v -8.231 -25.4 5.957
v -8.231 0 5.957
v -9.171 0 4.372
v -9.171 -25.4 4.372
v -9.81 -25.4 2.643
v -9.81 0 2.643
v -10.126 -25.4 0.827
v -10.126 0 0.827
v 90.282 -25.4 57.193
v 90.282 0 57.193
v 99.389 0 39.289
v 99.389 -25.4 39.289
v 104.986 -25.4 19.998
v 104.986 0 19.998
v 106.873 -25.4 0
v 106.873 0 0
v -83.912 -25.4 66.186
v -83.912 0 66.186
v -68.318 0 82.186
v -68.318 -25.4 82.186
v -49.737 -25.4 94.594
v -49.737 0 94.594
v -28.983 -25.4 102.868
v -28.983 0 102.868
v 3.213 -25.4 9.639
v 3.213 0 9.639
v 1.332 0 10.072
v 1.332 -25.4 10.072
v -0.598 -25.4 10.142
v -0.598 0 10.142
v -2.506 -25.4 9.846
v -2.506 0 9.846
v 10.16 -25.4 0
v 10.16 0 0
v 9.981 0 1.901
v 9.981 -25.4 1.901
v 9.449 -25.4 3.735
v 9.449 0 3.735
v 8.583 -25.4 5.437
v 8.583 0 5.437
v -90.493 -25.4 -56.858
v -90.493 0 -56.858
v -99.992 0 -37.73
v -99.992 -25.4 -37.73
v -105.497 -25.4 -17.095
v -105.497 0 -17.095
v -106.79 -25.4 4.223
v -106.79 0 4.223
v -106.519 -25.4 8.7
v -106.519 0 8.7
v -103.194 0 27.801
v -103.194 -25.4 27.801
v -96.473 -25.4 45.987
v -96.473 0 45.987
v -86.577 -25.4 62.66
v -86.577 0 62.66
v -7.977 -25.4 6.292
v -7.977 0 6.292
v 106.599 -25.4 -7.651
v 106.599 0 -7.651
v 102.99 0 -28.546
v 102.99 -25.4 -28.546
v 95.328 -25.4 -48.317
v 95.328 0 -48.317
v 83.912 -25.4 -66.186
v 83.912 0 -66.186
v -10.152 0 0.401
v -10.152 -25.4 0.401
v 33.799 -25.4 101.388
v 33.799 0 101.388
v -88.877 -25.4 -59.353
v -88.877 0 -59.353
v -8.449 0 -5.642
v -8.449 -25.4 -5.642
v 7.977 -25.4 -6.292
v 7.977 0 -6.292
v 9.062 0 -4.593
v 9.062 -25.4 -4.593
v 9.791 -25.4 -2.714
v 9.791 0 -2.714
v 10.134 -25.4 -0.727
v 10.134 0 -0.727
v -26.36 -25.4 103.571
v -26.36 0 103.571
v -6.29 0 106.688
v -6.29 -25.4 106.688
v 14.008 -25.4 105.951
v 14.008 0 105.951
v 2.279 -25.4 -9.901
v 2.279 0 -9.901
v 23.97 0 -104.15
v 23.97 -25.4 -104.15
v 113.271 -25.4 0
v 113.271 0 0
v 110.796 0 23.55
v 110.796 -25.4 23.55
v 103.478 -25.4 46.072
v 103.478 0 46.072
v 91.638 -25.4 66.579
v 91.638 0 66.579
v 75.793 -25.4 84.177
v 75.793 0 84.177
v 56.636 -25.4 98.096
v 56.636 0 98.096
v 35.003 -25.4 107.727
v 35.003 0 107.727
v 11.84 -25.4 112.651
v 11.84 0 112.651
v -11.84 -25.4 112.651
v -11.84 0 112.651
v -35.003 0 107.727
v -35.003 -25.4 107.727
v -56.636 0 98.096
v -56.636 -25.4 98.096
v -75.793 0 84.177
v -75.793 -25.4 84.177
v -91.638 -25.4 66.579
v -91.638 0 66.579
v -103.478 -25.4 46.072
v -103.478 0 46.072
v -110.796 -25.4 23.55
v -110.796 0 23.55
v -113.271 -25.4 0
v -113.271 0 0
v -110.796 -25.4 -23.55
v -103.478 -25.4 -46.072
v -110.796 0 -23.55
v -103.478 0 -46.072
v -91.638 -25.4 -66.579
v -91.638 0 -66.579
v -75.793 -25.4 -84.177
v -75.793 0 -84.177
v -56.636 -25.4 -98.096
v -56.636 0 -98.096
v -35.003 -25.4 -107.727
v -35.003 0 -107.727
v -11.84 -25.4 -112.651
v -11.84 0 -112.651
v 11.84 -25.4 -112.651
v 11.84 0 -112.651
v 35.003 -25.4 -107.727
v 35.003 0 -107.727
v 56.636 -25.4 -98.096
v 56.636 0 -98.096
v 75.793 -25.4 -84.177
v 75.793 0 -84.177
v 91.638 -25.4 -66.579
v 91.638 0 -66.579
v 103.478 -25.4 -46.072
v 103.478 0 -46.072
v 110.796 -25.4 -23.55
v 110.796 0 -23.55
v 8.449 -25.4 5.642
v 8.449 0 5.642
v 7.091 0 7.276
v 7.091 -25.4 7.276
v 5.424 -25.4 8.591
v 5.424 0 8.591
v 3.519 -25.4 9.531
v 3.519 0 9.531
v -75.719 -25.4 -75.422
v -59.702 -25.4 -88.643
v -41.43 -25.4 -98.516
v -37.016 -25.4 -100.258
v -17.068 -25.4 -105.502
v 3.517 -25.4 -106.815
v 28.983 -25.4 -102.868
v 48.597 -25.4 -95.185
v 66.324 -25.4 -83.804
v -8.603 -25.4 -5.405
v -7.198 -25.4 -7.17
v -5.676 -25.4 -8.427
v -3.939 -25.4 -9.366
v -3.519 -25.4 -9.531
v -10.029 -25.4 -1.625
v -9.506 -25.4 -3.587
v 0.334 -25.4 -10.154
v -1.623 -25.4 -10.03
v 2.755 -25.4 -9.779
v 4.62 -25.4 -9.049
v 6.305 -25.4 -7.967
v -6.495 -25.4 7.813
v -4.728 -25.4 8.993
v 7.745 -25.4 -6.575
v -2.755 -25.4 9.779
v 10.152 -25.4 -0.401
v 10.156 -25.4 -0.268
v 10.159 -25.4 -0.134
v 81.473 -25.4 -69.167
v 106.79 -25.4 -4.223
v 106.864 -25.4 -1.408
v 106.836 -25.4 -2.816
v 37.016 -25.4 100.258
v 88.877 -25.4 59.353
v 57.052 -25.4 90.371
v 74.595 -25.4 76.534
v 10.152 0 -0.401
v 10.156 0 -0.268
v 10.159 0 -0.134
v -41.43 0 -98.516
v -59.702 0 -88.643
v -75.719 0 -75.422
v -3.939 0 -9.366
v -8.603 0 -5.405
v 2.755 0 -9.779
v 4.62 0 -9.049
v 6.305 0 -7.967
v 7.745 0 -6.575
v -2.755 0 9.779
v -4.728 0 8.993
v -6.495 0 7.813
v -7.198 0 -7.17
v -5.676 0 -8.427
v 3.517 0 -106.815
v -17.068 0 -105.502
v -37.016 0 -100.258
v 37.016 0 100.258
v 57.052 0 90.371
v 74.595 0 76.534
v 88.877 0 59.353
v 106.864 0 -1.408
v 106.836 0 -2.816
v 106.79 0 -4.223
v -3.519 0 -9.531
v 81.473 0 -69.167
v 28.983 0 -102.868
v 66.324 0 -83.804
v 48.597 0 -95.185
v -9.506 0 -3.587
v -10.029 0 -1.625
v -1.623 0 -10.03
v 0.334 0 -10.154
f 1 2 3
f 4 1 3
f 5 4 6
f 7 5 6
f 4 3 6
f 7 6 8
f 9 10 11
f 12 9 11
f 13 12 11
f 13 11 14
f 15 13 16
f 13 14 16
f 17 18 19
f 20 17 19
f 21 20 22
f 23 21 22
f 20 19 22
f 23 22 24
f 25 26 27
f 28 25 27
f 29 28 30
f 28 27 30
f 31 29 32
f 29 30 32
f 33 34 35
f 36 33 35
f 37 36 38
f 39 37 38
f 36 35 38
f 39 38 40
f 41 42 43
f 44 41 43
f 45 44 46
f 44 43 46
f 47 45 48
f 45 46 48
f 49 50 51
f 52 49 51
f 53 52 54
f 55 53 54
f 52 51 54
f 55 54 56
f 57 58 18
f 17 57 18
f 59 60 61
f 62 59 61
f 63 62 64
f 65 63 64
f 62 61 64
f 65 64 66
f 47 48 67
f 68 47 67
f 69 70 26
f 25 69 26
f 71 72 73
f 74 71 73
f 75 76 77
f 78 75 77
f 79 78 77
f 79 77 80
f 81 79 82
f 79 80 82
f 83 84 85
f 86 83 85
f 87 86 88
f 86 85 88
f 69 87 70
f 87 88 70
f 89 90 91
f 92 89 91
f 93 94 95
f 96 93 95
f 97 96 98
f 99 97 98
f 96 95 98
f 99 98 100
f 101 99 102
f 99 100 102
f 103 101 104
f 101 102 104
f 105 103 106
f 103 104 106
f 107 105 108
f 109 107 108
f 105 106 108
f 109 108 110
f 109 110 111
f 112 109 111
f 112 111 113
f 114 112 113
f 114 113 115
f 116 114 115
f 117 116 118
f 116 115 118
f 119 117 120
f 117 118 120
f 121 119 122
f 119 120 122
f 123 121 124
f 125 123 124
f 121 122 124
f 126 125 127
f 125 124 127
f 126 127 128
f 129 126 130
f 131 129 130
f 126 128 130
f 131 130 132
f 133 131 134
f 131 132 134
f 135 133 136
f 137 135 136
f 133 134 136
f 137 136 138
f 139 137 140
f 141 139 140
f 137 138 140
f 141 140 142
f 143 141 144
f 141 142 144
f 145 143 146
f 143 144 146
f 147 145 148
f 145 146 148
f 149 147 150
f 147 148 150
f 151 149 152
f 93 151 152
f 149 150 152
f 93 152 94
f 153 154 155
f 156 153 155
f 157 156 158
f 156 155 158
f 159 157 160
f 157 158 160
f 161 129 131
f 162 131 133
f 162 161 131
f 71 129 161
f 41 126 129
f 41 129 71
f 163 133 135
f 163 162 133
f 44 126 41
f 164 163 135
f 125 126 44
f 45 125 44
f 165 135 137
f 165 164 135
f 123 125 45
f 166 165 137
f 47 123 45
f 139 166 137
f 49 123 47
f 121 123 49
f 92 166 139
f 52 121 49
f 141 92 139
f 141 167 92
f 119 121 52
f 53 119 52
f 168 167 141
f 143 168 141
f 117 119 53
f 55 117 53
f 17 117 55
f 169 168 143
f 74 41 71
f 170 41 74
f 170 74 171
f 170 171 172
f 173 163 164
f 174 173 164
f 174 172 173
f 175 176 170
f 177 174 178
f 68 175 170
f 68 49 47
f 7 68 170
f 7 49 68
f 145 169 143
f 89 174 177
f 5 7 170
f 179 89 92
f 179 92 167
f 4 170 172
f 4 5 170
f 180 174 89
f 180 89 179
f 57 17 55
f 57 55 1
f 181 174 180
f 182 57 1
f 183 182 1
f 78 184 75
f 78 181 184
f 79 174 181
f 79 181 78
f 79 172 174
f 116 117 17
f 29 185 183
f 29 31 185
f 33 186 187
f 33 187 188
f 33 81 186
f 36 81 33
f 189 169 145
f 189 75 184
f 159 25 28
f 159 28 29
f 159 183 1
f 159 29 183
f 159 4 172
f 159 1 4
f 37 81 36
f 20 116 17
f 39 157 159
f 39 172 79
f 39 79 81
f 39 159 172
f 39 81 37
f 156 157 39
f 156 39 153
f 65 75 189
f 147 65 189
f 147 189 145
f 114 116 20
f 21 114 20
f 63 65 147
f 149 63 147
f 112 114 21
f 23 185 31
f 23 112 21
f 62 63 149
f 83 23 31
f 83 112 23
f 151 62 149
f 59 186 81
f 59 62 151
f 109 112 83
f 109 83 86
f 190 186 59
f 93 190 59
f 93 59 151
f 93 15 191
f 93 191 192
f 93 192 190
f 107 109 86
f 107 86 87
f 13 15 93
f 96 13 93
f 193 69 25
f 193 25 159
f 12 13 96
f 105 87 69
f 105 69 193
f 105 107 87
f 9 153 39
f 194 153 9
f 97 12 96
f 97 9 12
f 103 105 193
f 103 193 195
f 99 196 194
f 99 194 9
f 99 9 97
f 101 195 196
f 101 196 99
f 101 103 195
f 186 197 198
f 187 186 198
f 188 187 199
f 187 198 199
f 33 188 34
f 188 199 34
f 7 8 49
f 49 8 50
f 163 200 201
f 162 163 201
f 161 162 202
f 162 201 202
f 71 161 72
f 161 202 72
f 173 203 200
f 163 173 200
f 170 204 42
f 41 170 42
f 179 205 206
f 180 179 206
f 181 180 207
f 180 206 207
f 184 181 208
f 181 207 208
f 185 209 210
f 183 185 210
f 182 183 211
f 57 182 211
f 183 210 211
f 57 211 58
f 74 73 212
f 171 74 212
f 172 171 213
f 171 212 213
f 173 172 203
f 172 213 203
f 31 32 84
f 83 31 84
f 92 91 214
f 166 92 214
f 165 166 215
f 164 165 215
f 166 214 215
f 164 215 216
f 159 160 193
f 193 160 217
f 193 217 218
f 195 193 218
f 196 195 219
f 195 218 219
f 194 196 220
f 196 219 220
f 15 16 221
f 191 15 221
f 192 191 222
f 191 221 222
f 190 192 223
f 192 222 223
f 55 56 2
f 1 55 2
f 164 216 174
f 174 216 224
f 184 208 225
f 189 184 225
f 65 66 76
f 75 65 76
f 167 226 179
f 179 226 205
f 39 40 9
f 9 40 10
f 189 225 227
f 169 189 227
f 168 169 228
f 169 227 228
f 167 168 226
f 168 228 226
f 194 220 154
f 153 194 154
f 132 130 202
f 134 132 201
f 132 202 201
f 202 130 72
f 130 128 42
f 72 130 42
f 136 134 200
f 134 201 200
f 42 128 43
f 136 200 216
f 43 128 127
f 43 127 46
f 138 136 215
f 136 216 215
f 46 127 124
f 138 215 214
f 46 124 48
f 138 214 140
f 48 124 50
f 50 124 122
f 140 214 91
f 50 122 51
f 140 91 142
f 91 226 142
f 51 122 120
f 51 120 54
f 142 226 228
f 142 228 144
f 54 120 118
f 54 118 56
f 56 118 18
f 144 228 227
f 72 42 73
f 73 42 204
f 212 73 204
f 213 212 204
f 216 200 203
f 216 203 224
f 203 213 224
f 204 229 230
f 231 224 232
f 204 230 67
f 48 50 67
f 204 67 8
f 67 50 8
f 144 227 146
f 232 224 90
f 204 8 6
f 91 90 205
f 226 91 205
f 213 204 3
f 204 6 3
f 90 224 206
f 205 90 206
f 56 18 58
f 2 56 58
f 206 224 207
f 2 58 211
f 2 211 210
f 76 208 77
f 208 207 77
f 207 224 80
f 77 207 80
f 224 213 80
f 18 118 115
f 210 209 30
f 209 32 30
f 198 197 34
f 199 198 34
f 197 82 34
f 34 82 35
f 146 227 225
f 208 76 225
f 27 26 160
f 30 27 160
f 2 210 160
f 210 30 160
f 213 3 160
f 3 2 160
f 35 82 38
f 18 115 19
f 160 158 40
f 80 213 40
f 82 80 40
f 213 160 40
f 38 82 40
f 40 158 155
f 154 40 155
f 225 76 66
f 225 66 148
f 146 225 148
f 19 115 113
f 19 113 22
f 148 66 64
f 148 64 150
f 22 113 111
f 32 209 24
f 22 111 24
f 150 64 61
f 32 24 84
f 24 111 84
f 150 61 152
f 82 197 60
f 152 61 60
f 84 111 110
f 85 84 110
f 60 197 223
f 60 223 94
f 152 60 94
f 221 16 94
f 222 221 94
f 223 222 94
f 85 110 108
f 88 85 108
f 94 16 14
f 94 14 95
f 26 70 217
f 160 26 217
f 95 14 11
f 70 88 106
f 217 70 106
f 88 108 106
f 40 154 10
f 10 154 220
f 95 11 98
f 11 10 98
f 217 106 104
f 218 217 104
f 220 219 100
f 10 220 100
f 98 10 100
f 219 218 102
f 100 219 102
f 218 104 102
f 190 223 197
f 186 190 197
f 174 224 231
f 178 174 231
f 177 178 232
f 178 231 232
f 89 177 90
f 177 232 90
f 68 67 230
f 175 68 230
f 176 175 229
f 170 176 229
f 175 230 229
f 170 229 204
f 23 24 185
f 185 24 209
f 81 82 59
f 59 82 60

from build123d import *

# Parameters (mm, degrees)
F1_DEPTH = 25.4
F0_R     = 113.2713200319
F2_DEPTH = 25.4


with BuildPart() as f1:
    # F0 (on Front) → F1 (new body)
    with BuildSketch(Plane.XZ):
        with BuildLine():
            Line((0, 0), (8.4491764715, 5.6424300575))
            ThreePointArc((8.4491764715, 5.6424300575), (6.2920375632, 7.9772089921), (3.518990179, 9.53112313))
            Line((3.518990179, 9.53112313), (0, 0))
        make_face()
        with BuildLine():
            Line((-2.5059085691, 9.8461171151), (0, 0))
            Line((0, 0), (3.2131374582, 9.6385345191))
            ThreePointArc((3.2131374582, 9.6385345191), (0.3685319646, 10.1533139512), (-2.5059085691, 9.8461171151))
        make_face()
        with BuildLine():
            Line((-7.9772089921, 6.2920375632), (0, 0))
            Line((0, 0), (-2.7553307558, 9.7792511179))
            ThreePointArc((-2.7553307558, 9.7792511179), (-5.6424300575, 8.4491764715), (-7.9772089921, 6.2920375632))
        make_face()
        with BuildLine():
            Line((-10.1262826145, 0.8270431738), (0, 0))
            Line((0, 0), (-8.2305254154, 5.9568491156))
            ThreePointArc((-8.2305254154, 5.9568491156), (-9.5300486626, 3.5218989889), (-10.1262826145, 0.8270431738))
        make_face()
        with BuildLine():
            Line((-8.6028237663, -5.4052773514), (0, 0))
            Line((0, 0), (-10.1520645288, 0.4014795179))
            ThreePointArc((-10.1520645288, 0.4014795179), (-9.816621877, -2.619071386), (-8.6028237663, -5.4052773514))
        make_face()
        with BuildLine():
            Line((2.2787747925, -9.9011507132), (0, 0))
            Line((0, 0), (-3.518990179, -9.53112313))
            ThreePointArc((-3.518990179, -9.53112313), (-0.6471195054, -10.139370609), (2.2787747925, -9.9011507132))
        make_face()
        with BuildLine():
            Line((7.7452963463, -6.5754075545), (0, 0))
            Line((0, 0), (2.7553307558, -9.7792511179))
            ThreePointArc((2.7553307558, -9.7792511179), (5.4892573067, -8.5494826873), (7.7452963463, -6.5754075545))
        make_face()
        with BuildLine():
            Line((10.1339284401, -0.727388734), (0, 0))
            Line((0, 0), (7.9772089921, -6.2920375632))
            ThreePointArc((7.9772089921, -6.2920375632), (9.4733655012, -3.6716407885), (10.1339284401, -0.727388734))
        make_face()
        with BuildLine():
            Line((-2.7553307558, 9.7792511179), (0, 0))
            Line((0, 0), (-2.5059085691, 9.8461171151))
            ThreePointArc((-2.5059085691, 9.8461171151), (-2.6308321067, 9.8134765719), (-2.7553307558, 9.7792511179))
        make_face()
        with BuildLine():
            Line((-8.2305254154, 5.9568491156), (0, 0))
            Line((0, 0), (-7.9772089921, 6.2920375632))
            ThreePointArc((-7.9772089921, 6.2920375632), (-8.1056000074, 6.1257528942), (-8.2305254154, 5.9568491156))
        make_face()
        with BuildLine():
            Line((-10.1520645288, 0.4014795179), (0, 0))
            Line((0, 0), (-10.1262826145, 0.8270431738))
            ThreePointArc((-10.1262826145, 0.8270431738), (-10.1414060575, 0.6143965965), (-10.1520645288, 0.4014795179))
        make_face()
        with BuildLine():
            Line((-8.4491764715, -5.6424300575), (0, 0))
            Line((0, 0), (-8.6028237663, -5.4052773514))
            ThreePointArc((-8.6028237663, -5.4052773514), (-8.5268246363, -5.5243878956), (-8.4491764715, -5.6424300575))
        make_face()
        with BuildLine():
            Line((-3.9385917856, -9.3655269337), (0, 0))
            Line((0, 0), (-8.4491764715, -5.6424300575))
            ThreePointArc((-8.4491764715, -5.6424300575), (-6.4675778453, -7.8355623164), (-3.9385917856, -9.3655269337))
        make_face()
        with BuildLine():
            Line((2.7553307558, -9.7792511179), (0, 0))
            Line((0, 0), (2.2787747925, -9.9011507132))
            ThreePointArc((2.2787747925, -9.9011507132), (2.517790608, -9.8430854133), (2.7553307558, -9.7792511179))
        make_face()
        with BuildLine():
            Line((-3.518990179, -9.53112313), (0, 0))
            Line((0, 0), (-3.9385917856, -9.3655269337))
            ThreePointArc((-3.9385917856, -9.3655269337), (-3.7297101382, -9.4506540665), (-3.518990179, -9.53112313))
        make_face()
        with BuildLine():
            Line((7.9772089921, -6.2920375632), (0, 0))
            Line((0, 0), (7.7452963463, -6.5754075545))
            ThreePointArc((7.7452963463, -6.5754075545), (7.8625293746, -6.4347674265), (7.9772089921, -6.2920375632))
        make_face()
        with BuildLine():
            ThreePointArc((10.1339284401, -0.727388734), (10.1443053921, -0.5645069636), (10.1520645288, -0.4014795179))
            Line((10.1520645288, -0.4014795179), (0, 0))
            Line((0, 0), (10.1339284401, -0.727388734))
        make_face()
        with BuildLine():
            ThreePointArc((10.1520645288, -0.4014795179), (10.1580159385, -0.2007789674), (10.16, 0))
            ThreePointArc((10.16, 0), (9.7577263861, 2.8306140277), (8.5827606744, 5.4370781864))
            Line((8.5827606744, 5.4370781864), (0, 0))
            Line((0, 0), (10.1520645288, -0.4014795179))
        make_face()
        with BuildLine():
            Line((0, 0), (8.5827606744, 5.4370781864))
            ThreePointArc((8.5827606744, 5.4370781864), (8.5165875257, 5.5401567592), (8.4491764715, 5.6424300575))
            Line((8.4491764715, 5.6424300575), (0, 0))
        make_face()
        with BuildLine():
            Line((3.2131374582, 9.6385345191), (0, 0))
            Line((0, 0), (3.518990179, 9.53112313))
            ThreePointArc((3.518990179, 9.53112313), (3.3664922297, 9.5860487203), (3.2131374582, 9.6385345191))
        make_face()
    extrude(amount=F1_DEPTH)

    # F0 (on Front) → F2 (join)
    with BuildSketch(Plane.XZ):
        Circle(F0_R)
        Polygon((90.5068083934, 60.4411965841), (91.6145348169, 58.0367329004), (104.7544467964, 29.5148519638), (108.7479900799, -4.3006120088), (108.0596985006, -7.7562623179), (102.0965224025, -37.6951021138), (85.4511357641, -67.3997329867), (60.4411965841, -90.5068083934), (29.5148519638, -104.7544467964), (-4.3006120088, -108.7479900799), (-37.6951021138, -102.0965224025), (-67.3997329867, -85.4511357641), (-90.5068083934, -60.4411965841), (-91.7838875883, -57.669130774), (-104.7544467964, -29.5148519638), (-108.7479900799, 4.3006120088), (-107.850128026, 8.8084359851), (-102.0965224025, 37.6951021138), (-87.6655406442, 63.4480026369), (-85.4511357641, 67.3997329867), (-60.4411965841, 90.5068083934), (-29.5148519638, 104.7544467964), (-26.7440517016, 105.0816731443), (4.3006120088, 108.7479900799), (34.2631514946, 102.7800935109), (37.6951021138, 102.0965224025), (67.3997329867, 85.4511357641), align=None, mode=Mode.SUBTRACT)
        with BuildLine():
            ThreePointArc((-8.2305254154, 5.9568491156), (-8.1056000074, 6.1257528942), (-7.9772089921, 6.2920375632))
            Line((-7.9772089921, 6.2920375632), (-83.9123738102, 66.1860318007))
            ThreePointArc((-83.9123738102, 66.1860318007), (-85.2629207095, 64.4368810237), (-86.577012837, 62.6601797971))
            Line((-86.577012837, 62.6601797971), (-8.2305254154, 5.9568491156))
        make_face()
        with BuildLine():
            Line((-28.9833630506, 102.8680803274), (-2.7553307558, 9.7792511179))
            ThreePointArc((-2.7553307558, 9.7792511179), (-2.6308321067, 9.8134765719), (-2.5059085691, 9.8461171151))
            Line((-2.5059085691, 9.8461171151), (-26.3596875538, 103.5714446942))
            ThreePointArc((-26.3596875538, 103.5714446942), (-27.6737600067, 103.2280983602), (-28.9833630506, 102.8680803274))
        make_face()
        with BuildLine():
            ThreePointArc((3.2131374582, 9.6385345191), (3.3664922297, 9.5860487203), (3.518990179, 9.53112313))
            Line((3.518990179, 9.53112313), (37.0163072861, 100.2580185266))
            ThreePointArc((37.0163072861, 100.2580185266), (35.4121792077, 100.8357815844), (33.7990382049, 101.3878804414))
            Line((33.7990382049, 101.3878804414), (3.2131374582, 9.6385345191))
        make_face()
        with BuildLine():
            ThreePointArc((8.4491764715, 5.6424300575), (8.5165875257, 5.5401567592), (8.5827606744, 5.4370781864))
            Line((8.5827606744, 5.4370781864), (90.282180491, 57.1927020673))
            ThreePointArc((90.282180491, 57.1927020673), (89.5861042071, 58.2769870272), (88.8770063774, 59.3528012933))
            Line((88.8770063774, 59.3528012933), (8.4491764715, 5.6424300575))
        make_face()
        with BuildLine():
            Line((106.789709851, -4.2231687065), (10.1520645288, -0.4014795179))
            ThreePointArc((10.1520645288, -0.4014795179), (10.1443053921, -0.5645069636), (10.1339284401, -0.727388734))
            Line((10.1339284401, -0.727388734), (106.5989360787, -7.6514123443))
            ThreePointArc((106.5989360787, -7.6514123443), (106.7080913827, -5.9380567058), (106.789709851, -4.2231687065))
        make_face()
        with BuildLine():
            Line((83.9123738102, -66.1860318007), (7.9772089921, -6.2920375632))
            ThreePointArc((7.9772089921, -6.2920375632), (7.8625293746, -6.4347674265), (7.7452963463, -6.5754075545))
            Line((7.7452963463, -6.5754075545), (81.4728814213, -69.1668047323))
            ThreePointArc((81.4728814213, -69.1668047323), (82.7060572982, -67.687409244), (83.9123738102, -66.1860318007))
        make_face()
        with BuildLine():
            Line((28.9833630506, -102.8680803274), (2.7553307558, -9.7792511179))
            ThreePointArc((2.7553307558, -9.7792511179), (2.517790608, -9.8430854133), (2.2787747925, -9.9011507132))
            Line((2.2787747925, -9.9011507132), (23.9704641575, -104.1503438883))
            ThreePointArc((23.9704641575, -104.1503438883), (26.4846748886, -103.5395541811), (28.9833630506, -102.8680803274))
        make_face()
        with BuildLine():
            Line((-37.0163072861, -100.2580185266), (-3.518990179, -9.53112313))
            ThreePointArc((-3.518990179, -9.53112313), (-3.7297101382, -9.4506540665), (-3.9385917856, -9.3655269337))
            Line((-3.9385917856, -9.3655269337), (-41.4301024994, -98.5161098038))
            ThreePointArc((-41.4301024994, -98.5161098038), (-39.2328735062, -99.4115633134), (-37.0163072861, -100.2580185266))
        make_face()
        with BuildLine():
            Line((-88.8770063774, -59.3528012933), (-8.4491764715, -5.6424300575))
            ThreePointArc((-8.4491764715, -5.6424300575), (-8.5268246363, -5.5243878956), (-8.6028237663, -5.4052773514))
            Line((-8.6028237663, -5.4052773514), (-90.4932244371, -56.8581886358))
            ThreePointArc((-90.4932244371, -56.8581886358), (-89.6937885179, -58.1111141287), (-88.8770063774, -59.3528012933))
        make_face()
        with BuildLine():
            Line((-106.789709851, 4.2231687065), (-10.1520645288, 0.4014795179))
            ThreePointArc((-10.1520645288, 0.4014795179), (-10.1414060575, 0.6143965965), (-10.1262826145, 0.8270431738))
            Line((-10.1262826145, 0.8270431738), (-106.5185095312, 8.6996788006))
            ThreePointArc((-106.5185095312, 8.6996788006), (-106.6775932408, 6.462846457), (-106.789709851, 4.2231687065))
        make_face()
        with BuildLine():
            ThreePointArc((-86.577012837, 62.6601797971), (-85.2629207095, 64.4368810237), (-83.9123738102, 66.1860318007))
            Line((-83.9123738102, 66.1860318007), (-85.4511357641, 67.3997329867))
            Line((-85.4511357641, 67.3997329867), (-87.6655406442, 63.4480026369))
            Line((-87.6655406442, 63.4480026369), (-86.577012837, 62.6601797971))
        make_face()
        with BuildLine():
            Line((-108.7479900799, 4.3006120088), (-106.789709851, 4.2231687065))
            ThreePointArc((-106.789709851, 4.2231687065), (-106.6775932408, 6.462846457), (-106.5185095312, 8.6996788006))
            Line((-106.5185095312, 8.6996788006), (-107.850128026, 8.8084359851))
            Line((-107.850128026, 8.8084359851), (-108.7479900799, 4.3006120088))
        make_face()
        with BuildLine():
            ThreePointArc((-106.5185095312, 8.6996788006), (-100.2467161886, 37.0469050984), (-86.577012837, 62.6601797971))
            Line((-86.577012837, 62.6601797971), (-87.6655406442, 63.4480026369))
            Line((-87.6655406442, 63.4480026369), (-102.0965224025, 37.6951021138))
            Line((-102.0965224025, 37.6951021138), (-107.850128026, 8.8084359851))
            Line((-107.850128026, 8.8084359851), (-106.5185095312, 8.6996788006))
        make_face()
        with BuildLine():
            Line((-91.7838875883, -57.669130774), (-90.4932244371, -56.8581886358))
            ThreePointArc((-90.4932244371, -56.8581886358), (-103.261183869, -27.5500488194), (-106.789709851, 4.2231687065))
            Line((-106.789709851, 4.2231687065), (-108.7479900799, 4.3006120088))
            Line((-108.7479900799, 4.3006120088), (-104.7544467964, -29.5148519638))
            Line((-104.7544467964, -29.5148519638), (-91.7838875883, -57.669130774))
        make_face()
        with BuildLine():
            Line((-90.5068083934, -60.4411965841), (-88.8770063774, -59.3528012933))
            ThreePointArc((-88.8770063774, -59.3528012933), (-89.6937885179, -58.1111141287), (-90.4932244371, -56.8581886358))
            Line((-90.4932244371, -56.8581886358), (-91.7838875883, -57.669130774))
            Line((-91.7838875883, -57.669130774), (-90.5068083934, -60.4411965841))
        make_face()
        with BuildLine():
            Line((-37.6951021138, -102.0965224025), (-37.0163072861, -100.2580185266))
            ThreePointArc((-37.0163072861, -100.2580185266), (-39.2328735062, -99.4115633134), (-41.4301024994, -98.5161098038))
            ThreePointArc((-41.4301024994, -98.5161098038), (-68.0325425023, -82.4223904327), (-88.8770063774, -59.3528012933))
            Line((-88.8770063774, -59.3528012933), (-90.5068083934, -60.4411965841))
            Line((-90.5068083934, -60.4411965841), (-67.3997329867, -85.4511357641))
            Line((-67.3997329867, -85.4511357641), (-37.6951021138, -102.0965224025))
        make_face()
        with BuildLine():
            Line((29.5148519638, -104.7544467964), (28.9833630506, -102.8680803274))
            ThreePointArc((28.9833630506, -102.8680803274), (26.4846748886, -103.5395541811), (23.9704641575, -104.1503438883))
            ThreePointArc((23.9704641575, -104.1503438883), (-6.8070591972, -106.6561823293), (-37.0163072861, -100.2580185266))
            Line((-37.0163072861, -100.2580185266), (-37.6951021138, -102.0965224025))
            Line((-37.6951021138, -102.0965224025), (-4.3006120088, -108.7479900799))
            Line((-4.3006120088, -108.7479900799), (29.5148519638, -104.7544467964))
        make_face()
        with BuildLine():
            Line((85.4511357641, -67.3997329867), (83.9123738102, -66.1860318007))
            ThreePointArc((83.9123738102, -66.1860318007), (82.7060572982, -67.687409244), (81.4728814213, -69.1668047323))
            ThreePointArc((81.4728814213, -69.1668047323), (57.7415749689, -89.9321288755), (28.9833630506, -102.8680803274))
            Line((28.9833630506, -102.8680803274), (29.5148519638, -104.7544467964))
            Line((29.5148519638, -104.7544467964), (60.4411965841, -90.5068083934))
            Line((60.4411965841, -90.5068083934), (85.4511357641, -67.3997329867))
        make_face()
        with BuildLine():
            Line((108.0596985006, -7.7562623179), (106.5989360787, -7.6514123443))
            ThreePointArc((106.5989360787, -7.6514123443), (99.6504652153, -38.6220411987), (83.9123738102, -66.1860318007))
            Line((83.9123738102, -66.1860318007), (85.4511357641, -67.3997329867))
            Line((85.4511357641, -67.3997329867), (102.0965224025, -37.6951021138))
            Line((102.0965224025, -37.6951021138), (108.0596985006, -7.7562623179))
        make_face()
        with BuildLine():
            Line((91.6145348169, 58.0367329004), (90.282180491, 57.1927020673))
            ThreePointArc((90.282180491, 57.1927020673), (102.6416613707, 29.7752688491), (106.8731831844, 0))
            ThreePointArc((106.8731831844, 0), (106.8523128133, -2.1119967875), (106.789709851, -4.2231687065))
            Line((106.789709851, -4.2231687065), (108.7479900799, -4.3006120088))
            Line((108.7479900799, -4.3006120088), (104.7544467964, 29.5148519638))
            Line((104.7544467964, 29.5148519638), (91.6145348169, 58.0367329004))
        make_face()
        with BuildLine():
            Line((108.7479900799, -4.3006120088), (106.789709851, -4.2231687065))
            ThreePointArc((106.789709851, -4.2231687065), (106.7080913827, -5.9380567058), (106.5989360787, -7.6514123443))
            Line((106.5989360787, -7.6514123443), (108.0596985006, -7.7562623179))
            Line((108.0596985006, -7.7562623179), (108.7479900799, -4.3006120088))
        make_face()
        with BuildLine():
            ThreePointArc((88.8770063774, 59.3528012933), (89.5861042071, 58.2769870272), (90.282180491, 57.1927020673))
            Line((90.282180491, 57.1927020673), (91.6145348169, 58.0367329004))
            Line((91.6145348169, 58.0367329004), (90.5068083934, 60.4411965841))
            Line((90.5068083934, 60.4411965841), (88.8770063774, 59.3528012933))
        make_face()
        with BuildLine():
            ThreePointArc((37.0163072861, 100.2580185266), (66.1860318007, 83.9123738102), (88.8770063774, 59.3528012933))
            Line((88.8770063774, 59.3528012933), (90.5068083934, 60.4411965841))
            Line((90.5068083934, 60.4411965841), (67.3997329867, 85.4511357641))
            Line((67.3997329867, 85.4511357641), (37.6951021138, 102.0965224025))
            Line((37.6951021138, 102.0965224025), (37.0163072861, 100.2580185266))
        make_face()
        with BuildLine():
            ThreePointArc((33.7990382049, 101.3878804414), (35.4121792077, 100.8357815844), (37.0163072861, 100.2580185266))
            Line((37.0163072861, 100.2580185266), (37.6951021138, 102.0965224025))
            Line((37.6951021138, 102.0965224025), (34.2631514946, 102.7800935109))
            Line((34.2631514946, 102.7800935109), (33.7990382049, 101.3878804414))
        make_face()
        with BuildLine():
            Line((-26.7440517016, 105.0816731443), (-26.3596875538, 103.5714446942))
            ThreePointArc((-26.3596875538, 103.5714446942), (3.8765929293, 106.8028525426), (33.7990382049, 101.3878804414))
            Line((33.7990382049, 101.3878804414), (34.2631514946, 102.7800935109))
            Line((34.2631514946, 102.7800935109), (4.3006120088, 108.7479900799))
            Line((4.3006120088, 108.7479900799), (-26.7440517016, 105.0816731443))
        make_face()
        with BuildLine():
            ThreePointArc((-83.9123738102, 66.1860318007), (-59.3528012933, 88.8770063774), (-28.9833630506, 102.8680803274))
            Line((-28.9833630506, 102.8680803274), (-29.5148519638, 104.7544467964))
            Line((-29.5148519638, 104.7544467964), (-60.4411965841, 90.5068083934))
            Line((-60.4411965841, 90.5068083934), (-85.4511357641, 67.3997329867))
            Line((-85.4511357641, 67.3997329867), (-83.9123738102, 66.1860318007))
        make_face()
        with BuildLine():
            Line((-29.5148519638, 104.7544467964), (-28.9833630506, 102.8680803274))
            ThreePointArc((-28.9833630506, 102.8680803274), (-27.6737600067, 103.2280983602), (-26.3596875538, 103.5714446942))
            Line((-26.3596875538, 103.5714446942), (-26.7440517016, 105.0816731443))
            Line((-26.7440517016, 105.0816731443), (-29.5148519638, 104.7544467964))
        make_face()
    extrude(amount=F2_DEPTH)


solid = f1.part
